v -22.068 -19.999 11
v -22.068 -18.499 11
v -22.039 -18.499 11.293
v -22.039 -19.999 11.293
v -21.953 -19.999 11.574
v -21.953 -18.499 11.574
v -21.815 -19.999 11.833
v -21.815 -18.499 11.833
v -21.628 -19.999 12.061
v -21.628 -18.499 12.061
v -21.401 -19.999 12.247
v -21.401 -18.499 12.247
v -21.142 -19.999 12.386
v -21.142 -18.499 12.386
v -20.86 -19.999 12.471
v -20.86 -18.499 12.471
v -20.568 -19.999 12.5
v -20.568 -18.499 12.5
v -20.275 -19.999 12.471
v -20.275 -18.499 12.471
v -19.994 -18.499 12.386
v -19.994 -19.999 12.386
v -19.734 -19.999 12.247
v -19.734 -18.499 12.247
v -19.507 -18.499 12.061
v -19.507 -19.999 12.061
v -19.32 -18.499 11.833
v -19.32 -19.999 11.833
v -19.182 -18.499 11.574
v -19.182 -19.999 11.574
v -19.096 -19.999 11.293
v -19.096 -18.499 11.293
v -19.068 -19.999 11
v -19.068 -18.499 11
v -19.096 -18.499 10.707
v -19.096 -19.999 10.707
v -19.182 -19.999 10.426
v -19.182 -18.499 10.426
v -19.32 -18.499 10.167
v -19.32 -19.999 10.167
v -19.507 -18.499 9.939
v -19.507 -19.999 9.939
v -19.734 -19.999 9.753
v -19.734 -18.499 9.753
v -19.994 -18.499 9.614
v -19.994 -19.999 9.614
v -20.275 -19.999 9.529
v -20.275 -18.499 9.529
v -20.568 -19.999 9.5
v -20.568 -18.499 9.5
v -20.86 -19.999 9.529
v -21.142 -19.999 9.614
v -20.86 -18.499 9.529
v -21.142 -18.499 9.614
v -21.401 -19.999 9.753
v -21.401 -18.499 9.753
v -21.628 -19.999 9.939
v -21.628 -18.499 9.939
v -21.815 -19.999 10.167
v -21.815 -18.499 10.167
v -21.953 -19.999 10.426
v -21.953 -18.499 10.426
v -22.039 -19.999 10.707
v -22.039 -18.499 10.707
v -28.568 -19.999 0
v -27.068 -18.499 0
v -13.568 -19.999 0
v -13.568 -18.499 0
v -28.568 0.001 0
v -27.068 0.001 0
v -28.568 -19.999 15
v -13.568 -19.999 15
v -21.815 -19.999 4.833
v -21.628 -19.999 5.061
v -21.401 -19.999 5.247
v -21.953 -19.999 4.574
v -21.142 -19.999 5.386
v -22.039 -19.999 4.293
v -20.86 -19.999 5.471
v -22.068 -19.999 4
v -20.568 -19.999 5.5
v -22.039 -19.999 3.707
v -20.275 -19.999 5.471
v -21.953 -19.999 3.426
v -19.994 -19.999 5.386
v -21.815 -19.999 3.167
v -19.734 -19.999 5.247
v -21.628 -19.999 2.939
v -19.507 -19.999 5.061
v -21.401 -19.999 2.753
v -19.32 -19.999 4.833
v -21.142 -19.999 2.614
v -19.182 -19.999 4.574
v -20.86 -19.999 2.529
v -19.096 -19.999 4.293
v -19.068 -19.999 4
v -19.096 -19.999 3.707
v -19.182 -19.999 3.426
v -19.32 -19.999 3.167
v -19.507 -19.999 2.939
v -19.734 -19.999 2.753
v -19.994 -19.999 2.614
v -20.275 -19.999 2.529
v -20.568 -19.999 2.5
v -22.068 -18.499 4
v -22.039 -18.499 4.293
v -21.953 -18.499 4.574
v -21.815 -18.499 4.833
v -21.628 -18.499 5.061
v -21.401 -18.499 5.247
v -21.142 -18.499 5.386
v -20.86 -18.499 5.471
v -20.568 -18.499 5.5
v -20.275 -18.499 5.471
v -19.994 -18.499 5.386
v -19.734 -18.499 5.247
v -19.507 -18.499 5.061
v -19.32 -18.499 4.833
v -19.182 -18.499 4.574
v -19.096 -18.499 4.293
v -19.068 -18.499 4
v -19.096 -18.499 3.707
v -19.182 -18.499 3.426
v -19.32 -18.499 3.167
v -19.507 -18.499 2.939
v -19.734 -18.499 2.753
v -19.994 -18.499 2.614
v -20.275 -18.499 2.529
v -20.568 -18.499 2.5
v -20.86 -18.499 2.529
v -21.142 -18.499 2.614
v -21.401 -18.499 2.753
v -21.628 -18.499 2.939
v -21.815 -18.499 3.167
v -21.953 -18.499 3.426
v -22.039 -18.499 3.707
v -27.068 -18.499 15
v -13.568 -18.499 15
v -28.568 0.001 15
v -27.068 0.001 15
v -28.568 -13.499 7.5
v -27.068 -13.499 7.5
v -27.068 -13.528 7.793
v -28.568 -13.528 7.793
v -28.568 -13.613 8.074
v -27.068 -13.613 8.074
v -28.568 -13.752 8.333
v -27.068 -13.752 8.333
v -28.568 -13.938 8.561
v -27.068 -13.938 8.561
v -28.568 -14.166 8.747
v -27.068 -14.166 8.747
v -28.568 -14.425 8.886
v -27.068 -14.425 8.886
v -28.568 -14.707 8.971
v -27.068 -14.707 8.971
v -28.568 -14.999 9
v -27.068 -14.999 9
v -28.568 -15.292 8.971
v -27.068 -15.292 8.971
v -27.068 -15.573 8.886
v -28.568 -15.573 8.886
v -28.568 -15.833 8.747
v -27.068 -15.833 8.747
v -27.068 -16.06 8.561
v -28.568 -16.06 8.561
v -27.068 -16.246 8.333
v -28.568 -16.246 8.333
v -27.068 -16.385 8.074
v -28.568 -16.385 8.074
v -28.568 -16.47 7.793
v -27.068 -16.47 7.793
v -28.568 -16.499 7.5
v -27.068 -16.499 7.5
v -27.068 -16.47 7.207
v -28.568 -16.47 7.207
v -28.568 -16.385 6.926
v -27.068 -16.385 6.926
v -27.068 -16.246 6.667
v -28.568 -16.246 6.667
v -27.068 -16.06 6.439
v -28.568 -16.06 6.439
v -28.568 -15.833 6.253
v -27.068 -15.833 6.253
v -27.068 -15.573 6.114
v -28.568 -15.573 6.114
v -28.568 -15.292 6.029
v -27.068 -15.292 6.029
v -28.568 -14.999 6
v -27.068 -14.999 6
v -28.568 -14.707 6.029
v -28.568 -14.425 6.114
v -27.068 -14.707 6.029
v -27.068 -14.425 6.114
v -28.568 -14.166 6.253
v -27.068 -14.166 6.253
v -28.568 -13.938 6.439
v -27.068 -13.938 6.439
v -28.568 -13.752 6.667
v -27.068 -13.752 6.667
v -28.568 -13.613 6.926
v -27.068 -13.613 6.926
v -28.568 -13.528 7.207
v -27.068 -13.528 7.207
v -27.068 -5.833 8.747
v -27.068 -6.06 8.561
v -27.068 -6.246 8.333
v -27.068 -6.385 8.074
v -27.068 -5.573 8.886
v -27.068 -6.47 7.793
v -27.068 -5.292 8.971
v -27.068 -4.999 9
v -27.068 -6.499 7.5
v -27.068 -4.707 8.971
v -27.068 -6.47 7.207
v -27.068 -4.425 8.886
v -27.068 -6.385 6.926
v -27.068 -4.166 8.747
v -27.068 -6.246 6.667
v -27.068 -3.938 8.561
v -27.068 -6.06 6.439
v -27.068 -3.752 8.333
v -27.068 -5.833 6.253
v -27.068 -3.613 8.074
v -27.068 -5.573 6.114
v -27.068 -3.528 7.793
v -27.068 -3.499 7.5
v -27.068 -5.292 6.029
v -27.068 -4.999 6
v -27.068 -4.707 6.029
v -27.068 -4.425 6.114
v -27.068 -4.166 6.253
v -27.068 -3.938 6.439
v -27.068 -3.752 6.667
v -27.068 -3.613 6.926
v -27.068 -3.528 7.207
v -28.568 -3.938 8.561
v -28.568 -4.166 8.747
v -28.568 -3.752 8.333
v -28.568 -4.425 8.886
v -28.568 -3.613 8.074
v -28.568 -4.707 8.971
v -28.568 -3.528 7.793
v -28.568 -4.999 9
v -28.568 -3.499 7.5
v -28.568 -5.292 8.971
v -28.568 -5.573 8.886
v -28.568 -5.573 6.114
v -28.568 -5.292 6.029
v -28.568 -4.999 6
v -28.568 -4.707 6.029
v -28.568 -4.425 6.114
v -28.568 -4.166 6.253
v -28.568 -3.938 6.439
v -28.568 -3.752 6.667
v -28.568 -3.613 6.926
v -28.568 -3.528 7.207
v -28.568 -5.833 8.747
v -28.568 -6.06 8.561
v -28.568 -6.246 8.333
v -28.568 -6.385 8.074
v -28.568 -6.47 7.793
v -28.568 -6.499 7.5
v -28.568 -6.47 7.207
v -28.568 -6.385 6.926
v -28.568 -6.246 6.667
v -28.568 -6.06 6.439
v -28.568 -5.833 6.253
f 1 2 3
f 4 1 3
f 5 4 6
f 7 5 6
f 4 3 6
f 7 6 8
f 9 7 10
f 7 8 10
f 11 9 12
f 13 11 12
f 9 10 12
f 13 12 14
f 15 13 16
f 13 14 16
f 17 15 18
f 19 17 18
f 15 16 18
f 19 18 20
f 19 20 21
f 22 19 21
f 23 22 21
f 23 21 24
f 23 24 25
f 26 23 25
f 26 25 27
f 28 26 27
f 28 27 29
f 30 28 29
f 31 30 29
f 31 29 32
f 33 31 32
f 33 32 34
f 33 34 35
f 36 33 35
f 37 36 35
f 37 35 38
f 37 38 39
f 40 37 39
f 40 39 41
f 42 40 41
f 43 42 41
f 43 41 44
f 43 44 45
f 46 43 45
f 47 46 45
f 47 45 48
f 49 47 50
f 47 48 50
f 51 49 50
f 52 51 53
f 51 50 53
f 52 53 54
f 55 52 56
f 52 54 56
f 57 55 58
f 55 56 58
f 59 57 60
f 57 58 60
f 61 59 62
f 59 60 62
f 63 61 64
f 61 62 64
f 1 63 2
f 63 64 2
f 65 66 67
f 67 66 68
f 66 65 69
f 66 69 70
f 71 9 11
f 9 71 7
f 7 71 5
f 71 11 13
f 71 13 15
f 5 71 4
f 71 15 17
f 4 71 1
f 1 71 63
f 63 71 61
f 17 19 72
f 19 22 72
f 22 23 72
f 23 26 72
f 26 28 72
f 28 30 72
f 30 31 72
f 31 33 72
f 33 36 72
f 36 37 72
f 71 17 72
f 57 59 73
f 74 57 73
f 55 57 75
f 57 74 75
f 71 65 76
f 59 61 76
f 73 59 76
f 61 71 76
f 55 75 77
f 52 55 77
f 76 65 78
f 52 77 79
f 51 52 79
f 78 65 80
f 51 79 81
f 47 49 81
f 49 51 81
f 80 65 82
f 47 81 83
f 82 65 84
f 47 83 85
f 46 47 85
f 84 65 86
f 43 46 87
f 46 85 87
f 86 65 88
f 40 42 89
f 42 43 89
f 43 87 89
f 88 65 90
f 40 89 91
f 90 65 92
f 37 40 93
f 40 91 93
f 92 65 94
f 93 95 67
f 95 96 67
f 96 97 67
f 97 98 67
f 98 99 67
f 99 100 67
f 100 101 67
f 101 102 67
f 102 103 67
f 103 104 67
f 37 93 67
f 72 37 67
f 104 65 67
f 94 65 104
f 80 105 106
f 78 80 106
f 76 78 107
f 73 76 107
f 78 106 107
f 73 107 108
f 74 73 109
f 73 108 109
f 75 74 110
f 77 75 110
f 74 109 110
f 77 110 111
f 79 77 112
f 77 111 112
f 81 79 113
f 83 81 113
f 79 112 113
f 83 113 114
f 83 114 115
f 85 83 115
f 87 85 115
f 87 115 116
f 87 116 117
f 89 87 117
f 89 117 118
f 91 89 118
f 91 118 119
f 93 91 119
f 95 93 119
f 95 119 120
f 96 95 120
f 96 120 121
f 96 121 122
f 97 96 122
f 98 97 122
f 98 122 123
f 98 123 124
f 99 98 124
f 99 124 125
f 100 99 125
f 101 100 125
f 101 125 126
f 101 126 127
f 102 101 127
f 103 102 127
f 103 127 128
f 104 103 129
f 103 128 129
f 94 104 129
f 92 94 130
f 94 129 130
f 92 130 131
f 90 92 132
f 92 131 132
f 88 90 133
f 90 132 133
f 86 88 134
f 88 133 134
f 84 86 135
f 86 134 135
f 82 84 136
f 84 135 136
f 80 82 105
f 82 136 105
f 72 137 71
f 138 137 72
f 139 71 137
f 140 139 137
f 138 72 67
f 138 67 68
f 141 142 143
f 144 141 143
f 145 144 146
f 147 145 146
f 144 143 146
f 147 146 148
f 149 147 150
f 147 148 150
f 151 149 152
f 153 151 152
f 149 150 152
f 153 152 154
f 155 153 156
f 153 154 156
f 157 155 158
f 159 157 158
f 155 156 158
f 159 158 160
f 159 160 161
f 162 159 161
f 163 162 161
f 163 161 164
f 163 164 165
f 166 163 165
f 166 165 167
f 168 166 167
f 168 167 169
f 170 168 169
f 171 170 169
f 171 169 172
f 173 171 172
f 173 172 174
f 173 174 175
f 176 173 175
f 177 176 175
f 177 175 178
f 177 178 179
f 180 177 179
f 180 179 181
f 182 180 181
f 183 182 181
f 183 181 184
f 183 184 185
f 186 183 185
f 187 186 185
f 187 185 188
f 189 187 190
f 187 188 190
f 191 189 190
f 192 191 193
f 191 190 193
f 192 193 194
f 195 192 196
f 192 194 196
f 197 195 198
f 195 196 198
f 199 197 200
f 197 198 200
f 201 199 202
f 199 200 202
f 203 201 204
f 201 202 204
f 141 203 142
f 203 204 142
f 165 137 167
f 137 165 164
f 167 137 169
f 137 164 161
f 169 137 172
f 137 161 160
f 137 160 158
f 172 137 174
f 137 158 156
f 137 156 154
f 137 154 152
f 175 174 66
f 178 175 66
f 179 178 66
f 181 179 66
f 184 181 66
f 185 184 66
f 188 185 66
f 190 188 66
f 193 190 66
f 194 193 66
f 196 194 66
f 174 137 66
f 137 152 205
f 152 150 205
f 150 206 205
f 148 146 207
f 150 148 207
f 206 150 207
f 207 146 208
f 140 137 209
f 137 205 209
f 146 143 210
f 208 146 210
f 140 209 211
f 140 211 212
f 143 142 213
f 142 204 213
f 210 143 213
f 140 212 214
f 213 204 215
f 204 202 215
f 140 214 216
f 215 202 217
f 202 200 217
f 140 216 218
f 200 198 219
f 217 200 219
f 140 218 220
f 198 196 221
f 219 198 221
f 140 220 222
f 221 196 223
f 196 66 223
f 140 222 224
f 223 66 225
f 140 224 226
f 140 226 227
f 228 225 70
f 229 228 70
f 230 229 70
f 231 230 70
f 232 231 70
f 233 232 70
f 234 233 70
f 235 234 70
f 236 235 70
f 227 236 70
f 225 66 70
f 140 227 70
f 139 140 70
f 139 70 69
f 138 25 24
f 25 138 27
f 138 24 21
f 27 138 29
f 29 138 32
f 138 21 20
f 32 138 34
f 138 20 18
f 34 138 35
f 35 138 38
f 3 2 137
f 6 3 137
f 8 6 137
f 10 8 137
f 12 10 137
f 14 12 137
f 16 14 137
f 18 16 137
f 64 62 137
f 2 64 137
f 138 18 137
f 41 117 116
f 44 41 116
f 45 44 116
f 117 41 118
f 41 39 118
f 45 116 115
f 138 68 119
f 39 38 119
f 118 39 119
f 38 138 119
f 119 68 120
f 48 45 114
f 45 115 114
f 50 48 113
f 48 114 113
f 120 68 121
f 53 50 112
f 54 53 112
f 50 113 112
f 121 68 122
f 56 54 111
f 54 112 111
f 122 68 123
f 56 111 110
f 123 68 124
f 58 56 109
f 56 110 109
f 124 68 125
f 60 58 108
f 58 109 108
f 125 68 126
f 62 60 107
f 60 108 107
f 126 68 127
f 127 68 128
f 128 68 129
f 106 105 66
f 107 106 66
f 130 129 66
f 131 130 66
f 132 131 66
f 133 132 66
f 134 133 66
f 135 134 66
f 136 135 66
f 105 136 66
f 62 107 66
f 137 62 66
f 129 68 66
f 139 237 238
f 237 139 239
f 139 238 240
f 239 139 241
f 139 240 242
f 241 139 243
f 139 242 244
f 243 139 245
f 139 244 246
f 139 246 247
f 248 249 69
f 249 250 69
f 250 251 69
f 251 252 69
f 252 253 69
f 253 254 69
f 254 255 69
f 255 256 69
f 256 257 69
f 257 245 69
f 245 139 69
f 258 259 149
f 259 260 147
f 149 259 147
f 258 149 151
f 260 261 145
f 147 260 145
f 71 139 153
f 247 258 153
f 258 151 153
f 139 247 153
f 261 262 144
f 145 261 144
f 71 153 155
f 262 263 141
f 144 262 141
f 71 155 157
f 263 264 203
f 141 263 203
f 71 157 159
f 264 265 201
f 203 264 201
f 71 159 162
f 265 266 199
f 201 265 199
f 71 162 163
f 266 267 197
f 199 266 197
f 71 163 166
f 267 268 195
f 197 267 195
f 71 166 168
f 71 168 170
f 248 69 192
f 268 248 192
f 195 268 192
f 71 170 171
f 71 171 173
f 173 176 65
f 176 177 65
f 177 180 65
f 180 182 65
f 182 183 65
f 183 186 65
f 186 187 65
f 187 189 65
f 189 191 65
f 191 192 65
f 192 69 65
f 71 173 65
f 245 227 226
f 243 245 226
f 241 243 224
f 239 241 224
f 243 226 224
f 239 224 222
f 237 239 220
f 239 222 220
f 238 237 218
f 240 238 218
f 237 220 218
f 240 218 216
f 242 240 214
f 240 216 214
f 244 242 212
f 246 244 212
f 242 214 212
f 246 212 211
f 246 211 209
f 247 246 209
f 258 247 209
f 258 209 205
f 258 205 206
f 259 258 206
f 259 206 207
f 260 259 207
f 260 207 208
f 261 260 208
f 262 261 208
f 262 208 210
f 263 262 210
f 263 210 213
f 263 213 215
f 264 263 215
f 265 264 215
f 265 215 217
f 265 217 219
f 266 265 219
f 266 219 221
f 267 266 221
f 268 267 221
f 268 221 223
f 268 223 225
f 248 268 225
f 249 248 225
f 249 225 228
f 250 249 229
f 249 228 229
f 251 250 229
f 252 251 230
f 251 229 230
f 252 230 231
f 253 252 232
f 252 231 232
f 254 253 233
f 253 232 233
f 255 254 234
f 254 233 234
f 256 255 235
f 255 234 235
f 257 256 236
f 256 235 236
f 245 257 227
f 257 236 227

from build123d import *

# Parameters (mm, degrees)
EXTRUSION1_DEPTH = 15
ESQUISSE2_R      = 1.5
EXTRUSION2_DEPTH = 15
ESQUISSE3_R      = 1.5
EXTRUSION3_DEPTH = 15


with BuildPart() as part:
    # Esquisse1 → Extrusion1 (new body)
    with BuildSketch(Plane.XY):
        Polygon((-28.567581117, 0.000842105), (-28.567581117, -19.999157895), (-13.567581117, -19.999157895), (-13.567581117, -18.499157895), (-27.067581117, -18.499157895), (-27.067581117, 0.000842105), align=None)
    extrude(amount=EXTRUSION1_DEPTH)

    # Esquisse2 → Extrusion2 (cut)
    with BuildSketch(Plane(origin=(0, -18.499157895, 0), x_dir=(-1, 0, 0), z_dir=(0, 1, 0))):
        with Locations((20.567581117, 4)):
            Circle(ESQUISSE2_R)
        with Locations((20.567581117, 11)):
            Circle(ESQUISSE2_R)
    extrude(amount=-EXTRUSION2_DEPTH, mode=Mode.SUBTRACT)

    # Esquisse3 → Extrusion3 (cut)
    with BuildSketch(Plane(origin=(-27.067581117, 0, 0), x_dir=(0, 0, -1), z_dir=(1, 0, 0))):
        with Locations(Location((-7.5, -4.999157895, 0), (0, 0, 90))):
            Circle(ESQUISSE3_R)
        with Locations(Location((-7.5, -14.999157895, 0), (0, 0, 90))):
            Circle(ESQUISSE3_R)
    extrude(amount=-EXTRUSION3_DEPTH, mode=Mode.SUBTRACT)


solid = part.part
